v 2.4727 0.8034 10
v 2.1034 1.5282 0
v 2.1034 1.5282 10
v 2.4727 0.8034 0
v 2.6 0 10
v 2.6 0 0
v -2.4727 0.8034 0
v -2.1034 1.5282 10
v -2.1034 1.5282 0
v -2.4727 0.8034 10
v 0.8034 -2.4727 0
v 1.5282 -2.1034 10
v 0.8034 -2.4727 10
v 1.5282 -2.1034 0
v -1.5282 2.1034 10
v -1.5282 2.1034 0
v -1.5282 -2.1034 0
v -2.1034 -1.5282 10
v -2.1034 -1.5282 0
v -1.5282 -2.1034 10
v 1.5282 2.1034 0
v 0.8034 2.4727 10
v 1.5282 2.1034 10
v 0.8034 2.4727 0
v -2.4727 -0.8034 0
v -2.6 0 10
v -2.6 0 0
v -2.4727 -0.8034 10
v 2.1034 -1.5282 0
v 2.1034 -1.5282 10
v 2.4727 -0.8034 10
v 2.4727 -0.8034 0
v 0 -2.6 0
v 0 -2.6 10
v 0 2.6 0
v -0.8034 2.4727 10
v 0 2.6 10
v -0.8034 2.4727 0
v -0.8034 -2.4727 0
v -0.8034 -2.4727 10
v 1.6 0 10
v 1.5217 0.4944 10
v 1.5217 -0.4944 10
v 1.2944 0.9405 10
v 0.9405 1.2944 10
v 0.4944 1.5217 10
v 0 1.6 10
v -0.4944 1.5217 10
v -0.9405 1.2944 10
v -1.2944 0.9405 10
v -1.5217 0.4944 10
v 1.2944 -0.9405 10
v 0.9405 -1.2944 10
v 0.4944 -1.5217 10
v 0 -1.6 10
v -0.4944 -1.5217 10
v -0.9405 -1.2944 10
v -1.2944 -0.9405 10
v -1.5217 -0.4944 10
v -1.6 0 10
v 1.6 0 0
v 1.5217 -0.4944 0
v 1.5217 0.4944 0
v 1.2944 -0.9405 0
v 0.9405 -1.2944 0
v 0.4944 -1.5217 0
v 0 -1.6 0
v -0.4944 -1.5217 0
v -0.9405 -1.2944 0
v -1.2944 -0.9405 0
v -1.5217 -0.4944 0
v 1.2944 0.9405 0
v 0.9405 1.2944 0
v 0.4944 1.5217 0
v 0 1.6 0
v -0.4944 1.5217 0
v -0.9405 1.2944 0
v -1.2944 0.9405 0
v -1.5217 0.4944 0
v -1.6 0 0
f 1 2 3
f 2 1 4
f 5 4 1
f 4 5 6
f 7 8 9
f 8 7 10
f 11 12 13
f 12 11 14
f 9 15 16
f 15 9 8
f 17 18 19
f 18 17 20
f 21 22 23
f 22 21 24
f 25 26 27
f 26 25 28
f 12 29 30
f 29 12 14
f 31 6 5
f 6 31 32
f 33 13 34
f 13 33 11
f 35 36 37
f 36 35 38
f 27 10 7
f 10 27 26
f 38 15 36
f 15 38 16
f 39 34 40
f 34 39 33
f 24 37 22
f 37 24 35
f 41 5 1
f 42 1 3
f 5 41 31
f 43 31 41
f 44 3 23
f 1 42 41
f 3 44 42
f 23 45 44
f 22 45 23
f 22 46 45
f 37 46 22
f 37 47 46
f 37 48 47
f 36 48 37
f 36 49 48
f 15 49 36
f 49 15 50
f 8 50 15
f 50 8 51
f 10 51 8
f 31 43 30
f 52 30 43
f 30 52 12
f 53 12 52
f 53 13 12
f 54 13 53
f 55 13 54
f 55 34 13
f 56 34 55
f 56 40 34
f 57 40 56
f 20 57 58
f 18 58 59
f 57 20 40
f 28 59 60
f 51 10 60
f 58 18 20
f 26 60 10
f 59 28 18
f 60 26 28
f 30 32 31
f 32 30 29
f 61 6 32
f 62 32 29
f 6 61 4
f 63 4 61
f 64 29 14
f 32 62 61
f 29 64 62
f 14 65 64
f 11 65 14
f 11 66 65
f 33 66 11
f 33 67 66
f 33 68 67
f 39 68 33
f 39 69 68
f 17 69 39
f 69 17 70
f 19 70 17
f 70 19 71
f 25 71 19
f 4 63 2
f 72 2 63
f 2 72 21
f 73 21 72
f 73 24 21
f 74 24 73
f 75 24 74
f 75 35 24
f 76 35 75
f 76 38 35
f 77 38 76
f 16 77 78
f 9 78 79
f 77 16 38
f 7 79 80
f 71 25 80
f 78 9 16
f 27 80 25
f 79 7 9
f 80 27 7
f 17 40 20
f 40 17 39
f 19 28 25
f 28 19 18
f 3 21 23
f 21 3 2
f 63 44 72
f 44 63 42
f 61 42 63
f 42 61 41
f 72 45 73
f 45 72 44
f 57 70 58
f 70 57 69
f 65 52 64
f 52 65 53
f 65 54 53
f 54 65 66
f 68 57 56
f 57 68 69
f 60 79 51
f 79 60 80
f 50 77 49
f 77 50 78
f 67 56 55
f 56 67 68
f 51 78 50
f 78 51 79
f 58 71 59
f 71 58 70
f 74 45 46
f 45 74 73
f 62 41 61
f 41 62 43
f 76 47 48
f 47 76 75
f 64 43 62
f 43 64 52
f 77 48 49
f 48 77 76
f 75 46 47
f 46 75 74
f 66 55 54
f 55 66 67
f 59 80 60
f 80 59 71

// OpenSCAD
difference() {
    cylinder(h=10,d=5.2, $fn=20);
    cylinder(h=10,d=3.2, $fn=20);
}
